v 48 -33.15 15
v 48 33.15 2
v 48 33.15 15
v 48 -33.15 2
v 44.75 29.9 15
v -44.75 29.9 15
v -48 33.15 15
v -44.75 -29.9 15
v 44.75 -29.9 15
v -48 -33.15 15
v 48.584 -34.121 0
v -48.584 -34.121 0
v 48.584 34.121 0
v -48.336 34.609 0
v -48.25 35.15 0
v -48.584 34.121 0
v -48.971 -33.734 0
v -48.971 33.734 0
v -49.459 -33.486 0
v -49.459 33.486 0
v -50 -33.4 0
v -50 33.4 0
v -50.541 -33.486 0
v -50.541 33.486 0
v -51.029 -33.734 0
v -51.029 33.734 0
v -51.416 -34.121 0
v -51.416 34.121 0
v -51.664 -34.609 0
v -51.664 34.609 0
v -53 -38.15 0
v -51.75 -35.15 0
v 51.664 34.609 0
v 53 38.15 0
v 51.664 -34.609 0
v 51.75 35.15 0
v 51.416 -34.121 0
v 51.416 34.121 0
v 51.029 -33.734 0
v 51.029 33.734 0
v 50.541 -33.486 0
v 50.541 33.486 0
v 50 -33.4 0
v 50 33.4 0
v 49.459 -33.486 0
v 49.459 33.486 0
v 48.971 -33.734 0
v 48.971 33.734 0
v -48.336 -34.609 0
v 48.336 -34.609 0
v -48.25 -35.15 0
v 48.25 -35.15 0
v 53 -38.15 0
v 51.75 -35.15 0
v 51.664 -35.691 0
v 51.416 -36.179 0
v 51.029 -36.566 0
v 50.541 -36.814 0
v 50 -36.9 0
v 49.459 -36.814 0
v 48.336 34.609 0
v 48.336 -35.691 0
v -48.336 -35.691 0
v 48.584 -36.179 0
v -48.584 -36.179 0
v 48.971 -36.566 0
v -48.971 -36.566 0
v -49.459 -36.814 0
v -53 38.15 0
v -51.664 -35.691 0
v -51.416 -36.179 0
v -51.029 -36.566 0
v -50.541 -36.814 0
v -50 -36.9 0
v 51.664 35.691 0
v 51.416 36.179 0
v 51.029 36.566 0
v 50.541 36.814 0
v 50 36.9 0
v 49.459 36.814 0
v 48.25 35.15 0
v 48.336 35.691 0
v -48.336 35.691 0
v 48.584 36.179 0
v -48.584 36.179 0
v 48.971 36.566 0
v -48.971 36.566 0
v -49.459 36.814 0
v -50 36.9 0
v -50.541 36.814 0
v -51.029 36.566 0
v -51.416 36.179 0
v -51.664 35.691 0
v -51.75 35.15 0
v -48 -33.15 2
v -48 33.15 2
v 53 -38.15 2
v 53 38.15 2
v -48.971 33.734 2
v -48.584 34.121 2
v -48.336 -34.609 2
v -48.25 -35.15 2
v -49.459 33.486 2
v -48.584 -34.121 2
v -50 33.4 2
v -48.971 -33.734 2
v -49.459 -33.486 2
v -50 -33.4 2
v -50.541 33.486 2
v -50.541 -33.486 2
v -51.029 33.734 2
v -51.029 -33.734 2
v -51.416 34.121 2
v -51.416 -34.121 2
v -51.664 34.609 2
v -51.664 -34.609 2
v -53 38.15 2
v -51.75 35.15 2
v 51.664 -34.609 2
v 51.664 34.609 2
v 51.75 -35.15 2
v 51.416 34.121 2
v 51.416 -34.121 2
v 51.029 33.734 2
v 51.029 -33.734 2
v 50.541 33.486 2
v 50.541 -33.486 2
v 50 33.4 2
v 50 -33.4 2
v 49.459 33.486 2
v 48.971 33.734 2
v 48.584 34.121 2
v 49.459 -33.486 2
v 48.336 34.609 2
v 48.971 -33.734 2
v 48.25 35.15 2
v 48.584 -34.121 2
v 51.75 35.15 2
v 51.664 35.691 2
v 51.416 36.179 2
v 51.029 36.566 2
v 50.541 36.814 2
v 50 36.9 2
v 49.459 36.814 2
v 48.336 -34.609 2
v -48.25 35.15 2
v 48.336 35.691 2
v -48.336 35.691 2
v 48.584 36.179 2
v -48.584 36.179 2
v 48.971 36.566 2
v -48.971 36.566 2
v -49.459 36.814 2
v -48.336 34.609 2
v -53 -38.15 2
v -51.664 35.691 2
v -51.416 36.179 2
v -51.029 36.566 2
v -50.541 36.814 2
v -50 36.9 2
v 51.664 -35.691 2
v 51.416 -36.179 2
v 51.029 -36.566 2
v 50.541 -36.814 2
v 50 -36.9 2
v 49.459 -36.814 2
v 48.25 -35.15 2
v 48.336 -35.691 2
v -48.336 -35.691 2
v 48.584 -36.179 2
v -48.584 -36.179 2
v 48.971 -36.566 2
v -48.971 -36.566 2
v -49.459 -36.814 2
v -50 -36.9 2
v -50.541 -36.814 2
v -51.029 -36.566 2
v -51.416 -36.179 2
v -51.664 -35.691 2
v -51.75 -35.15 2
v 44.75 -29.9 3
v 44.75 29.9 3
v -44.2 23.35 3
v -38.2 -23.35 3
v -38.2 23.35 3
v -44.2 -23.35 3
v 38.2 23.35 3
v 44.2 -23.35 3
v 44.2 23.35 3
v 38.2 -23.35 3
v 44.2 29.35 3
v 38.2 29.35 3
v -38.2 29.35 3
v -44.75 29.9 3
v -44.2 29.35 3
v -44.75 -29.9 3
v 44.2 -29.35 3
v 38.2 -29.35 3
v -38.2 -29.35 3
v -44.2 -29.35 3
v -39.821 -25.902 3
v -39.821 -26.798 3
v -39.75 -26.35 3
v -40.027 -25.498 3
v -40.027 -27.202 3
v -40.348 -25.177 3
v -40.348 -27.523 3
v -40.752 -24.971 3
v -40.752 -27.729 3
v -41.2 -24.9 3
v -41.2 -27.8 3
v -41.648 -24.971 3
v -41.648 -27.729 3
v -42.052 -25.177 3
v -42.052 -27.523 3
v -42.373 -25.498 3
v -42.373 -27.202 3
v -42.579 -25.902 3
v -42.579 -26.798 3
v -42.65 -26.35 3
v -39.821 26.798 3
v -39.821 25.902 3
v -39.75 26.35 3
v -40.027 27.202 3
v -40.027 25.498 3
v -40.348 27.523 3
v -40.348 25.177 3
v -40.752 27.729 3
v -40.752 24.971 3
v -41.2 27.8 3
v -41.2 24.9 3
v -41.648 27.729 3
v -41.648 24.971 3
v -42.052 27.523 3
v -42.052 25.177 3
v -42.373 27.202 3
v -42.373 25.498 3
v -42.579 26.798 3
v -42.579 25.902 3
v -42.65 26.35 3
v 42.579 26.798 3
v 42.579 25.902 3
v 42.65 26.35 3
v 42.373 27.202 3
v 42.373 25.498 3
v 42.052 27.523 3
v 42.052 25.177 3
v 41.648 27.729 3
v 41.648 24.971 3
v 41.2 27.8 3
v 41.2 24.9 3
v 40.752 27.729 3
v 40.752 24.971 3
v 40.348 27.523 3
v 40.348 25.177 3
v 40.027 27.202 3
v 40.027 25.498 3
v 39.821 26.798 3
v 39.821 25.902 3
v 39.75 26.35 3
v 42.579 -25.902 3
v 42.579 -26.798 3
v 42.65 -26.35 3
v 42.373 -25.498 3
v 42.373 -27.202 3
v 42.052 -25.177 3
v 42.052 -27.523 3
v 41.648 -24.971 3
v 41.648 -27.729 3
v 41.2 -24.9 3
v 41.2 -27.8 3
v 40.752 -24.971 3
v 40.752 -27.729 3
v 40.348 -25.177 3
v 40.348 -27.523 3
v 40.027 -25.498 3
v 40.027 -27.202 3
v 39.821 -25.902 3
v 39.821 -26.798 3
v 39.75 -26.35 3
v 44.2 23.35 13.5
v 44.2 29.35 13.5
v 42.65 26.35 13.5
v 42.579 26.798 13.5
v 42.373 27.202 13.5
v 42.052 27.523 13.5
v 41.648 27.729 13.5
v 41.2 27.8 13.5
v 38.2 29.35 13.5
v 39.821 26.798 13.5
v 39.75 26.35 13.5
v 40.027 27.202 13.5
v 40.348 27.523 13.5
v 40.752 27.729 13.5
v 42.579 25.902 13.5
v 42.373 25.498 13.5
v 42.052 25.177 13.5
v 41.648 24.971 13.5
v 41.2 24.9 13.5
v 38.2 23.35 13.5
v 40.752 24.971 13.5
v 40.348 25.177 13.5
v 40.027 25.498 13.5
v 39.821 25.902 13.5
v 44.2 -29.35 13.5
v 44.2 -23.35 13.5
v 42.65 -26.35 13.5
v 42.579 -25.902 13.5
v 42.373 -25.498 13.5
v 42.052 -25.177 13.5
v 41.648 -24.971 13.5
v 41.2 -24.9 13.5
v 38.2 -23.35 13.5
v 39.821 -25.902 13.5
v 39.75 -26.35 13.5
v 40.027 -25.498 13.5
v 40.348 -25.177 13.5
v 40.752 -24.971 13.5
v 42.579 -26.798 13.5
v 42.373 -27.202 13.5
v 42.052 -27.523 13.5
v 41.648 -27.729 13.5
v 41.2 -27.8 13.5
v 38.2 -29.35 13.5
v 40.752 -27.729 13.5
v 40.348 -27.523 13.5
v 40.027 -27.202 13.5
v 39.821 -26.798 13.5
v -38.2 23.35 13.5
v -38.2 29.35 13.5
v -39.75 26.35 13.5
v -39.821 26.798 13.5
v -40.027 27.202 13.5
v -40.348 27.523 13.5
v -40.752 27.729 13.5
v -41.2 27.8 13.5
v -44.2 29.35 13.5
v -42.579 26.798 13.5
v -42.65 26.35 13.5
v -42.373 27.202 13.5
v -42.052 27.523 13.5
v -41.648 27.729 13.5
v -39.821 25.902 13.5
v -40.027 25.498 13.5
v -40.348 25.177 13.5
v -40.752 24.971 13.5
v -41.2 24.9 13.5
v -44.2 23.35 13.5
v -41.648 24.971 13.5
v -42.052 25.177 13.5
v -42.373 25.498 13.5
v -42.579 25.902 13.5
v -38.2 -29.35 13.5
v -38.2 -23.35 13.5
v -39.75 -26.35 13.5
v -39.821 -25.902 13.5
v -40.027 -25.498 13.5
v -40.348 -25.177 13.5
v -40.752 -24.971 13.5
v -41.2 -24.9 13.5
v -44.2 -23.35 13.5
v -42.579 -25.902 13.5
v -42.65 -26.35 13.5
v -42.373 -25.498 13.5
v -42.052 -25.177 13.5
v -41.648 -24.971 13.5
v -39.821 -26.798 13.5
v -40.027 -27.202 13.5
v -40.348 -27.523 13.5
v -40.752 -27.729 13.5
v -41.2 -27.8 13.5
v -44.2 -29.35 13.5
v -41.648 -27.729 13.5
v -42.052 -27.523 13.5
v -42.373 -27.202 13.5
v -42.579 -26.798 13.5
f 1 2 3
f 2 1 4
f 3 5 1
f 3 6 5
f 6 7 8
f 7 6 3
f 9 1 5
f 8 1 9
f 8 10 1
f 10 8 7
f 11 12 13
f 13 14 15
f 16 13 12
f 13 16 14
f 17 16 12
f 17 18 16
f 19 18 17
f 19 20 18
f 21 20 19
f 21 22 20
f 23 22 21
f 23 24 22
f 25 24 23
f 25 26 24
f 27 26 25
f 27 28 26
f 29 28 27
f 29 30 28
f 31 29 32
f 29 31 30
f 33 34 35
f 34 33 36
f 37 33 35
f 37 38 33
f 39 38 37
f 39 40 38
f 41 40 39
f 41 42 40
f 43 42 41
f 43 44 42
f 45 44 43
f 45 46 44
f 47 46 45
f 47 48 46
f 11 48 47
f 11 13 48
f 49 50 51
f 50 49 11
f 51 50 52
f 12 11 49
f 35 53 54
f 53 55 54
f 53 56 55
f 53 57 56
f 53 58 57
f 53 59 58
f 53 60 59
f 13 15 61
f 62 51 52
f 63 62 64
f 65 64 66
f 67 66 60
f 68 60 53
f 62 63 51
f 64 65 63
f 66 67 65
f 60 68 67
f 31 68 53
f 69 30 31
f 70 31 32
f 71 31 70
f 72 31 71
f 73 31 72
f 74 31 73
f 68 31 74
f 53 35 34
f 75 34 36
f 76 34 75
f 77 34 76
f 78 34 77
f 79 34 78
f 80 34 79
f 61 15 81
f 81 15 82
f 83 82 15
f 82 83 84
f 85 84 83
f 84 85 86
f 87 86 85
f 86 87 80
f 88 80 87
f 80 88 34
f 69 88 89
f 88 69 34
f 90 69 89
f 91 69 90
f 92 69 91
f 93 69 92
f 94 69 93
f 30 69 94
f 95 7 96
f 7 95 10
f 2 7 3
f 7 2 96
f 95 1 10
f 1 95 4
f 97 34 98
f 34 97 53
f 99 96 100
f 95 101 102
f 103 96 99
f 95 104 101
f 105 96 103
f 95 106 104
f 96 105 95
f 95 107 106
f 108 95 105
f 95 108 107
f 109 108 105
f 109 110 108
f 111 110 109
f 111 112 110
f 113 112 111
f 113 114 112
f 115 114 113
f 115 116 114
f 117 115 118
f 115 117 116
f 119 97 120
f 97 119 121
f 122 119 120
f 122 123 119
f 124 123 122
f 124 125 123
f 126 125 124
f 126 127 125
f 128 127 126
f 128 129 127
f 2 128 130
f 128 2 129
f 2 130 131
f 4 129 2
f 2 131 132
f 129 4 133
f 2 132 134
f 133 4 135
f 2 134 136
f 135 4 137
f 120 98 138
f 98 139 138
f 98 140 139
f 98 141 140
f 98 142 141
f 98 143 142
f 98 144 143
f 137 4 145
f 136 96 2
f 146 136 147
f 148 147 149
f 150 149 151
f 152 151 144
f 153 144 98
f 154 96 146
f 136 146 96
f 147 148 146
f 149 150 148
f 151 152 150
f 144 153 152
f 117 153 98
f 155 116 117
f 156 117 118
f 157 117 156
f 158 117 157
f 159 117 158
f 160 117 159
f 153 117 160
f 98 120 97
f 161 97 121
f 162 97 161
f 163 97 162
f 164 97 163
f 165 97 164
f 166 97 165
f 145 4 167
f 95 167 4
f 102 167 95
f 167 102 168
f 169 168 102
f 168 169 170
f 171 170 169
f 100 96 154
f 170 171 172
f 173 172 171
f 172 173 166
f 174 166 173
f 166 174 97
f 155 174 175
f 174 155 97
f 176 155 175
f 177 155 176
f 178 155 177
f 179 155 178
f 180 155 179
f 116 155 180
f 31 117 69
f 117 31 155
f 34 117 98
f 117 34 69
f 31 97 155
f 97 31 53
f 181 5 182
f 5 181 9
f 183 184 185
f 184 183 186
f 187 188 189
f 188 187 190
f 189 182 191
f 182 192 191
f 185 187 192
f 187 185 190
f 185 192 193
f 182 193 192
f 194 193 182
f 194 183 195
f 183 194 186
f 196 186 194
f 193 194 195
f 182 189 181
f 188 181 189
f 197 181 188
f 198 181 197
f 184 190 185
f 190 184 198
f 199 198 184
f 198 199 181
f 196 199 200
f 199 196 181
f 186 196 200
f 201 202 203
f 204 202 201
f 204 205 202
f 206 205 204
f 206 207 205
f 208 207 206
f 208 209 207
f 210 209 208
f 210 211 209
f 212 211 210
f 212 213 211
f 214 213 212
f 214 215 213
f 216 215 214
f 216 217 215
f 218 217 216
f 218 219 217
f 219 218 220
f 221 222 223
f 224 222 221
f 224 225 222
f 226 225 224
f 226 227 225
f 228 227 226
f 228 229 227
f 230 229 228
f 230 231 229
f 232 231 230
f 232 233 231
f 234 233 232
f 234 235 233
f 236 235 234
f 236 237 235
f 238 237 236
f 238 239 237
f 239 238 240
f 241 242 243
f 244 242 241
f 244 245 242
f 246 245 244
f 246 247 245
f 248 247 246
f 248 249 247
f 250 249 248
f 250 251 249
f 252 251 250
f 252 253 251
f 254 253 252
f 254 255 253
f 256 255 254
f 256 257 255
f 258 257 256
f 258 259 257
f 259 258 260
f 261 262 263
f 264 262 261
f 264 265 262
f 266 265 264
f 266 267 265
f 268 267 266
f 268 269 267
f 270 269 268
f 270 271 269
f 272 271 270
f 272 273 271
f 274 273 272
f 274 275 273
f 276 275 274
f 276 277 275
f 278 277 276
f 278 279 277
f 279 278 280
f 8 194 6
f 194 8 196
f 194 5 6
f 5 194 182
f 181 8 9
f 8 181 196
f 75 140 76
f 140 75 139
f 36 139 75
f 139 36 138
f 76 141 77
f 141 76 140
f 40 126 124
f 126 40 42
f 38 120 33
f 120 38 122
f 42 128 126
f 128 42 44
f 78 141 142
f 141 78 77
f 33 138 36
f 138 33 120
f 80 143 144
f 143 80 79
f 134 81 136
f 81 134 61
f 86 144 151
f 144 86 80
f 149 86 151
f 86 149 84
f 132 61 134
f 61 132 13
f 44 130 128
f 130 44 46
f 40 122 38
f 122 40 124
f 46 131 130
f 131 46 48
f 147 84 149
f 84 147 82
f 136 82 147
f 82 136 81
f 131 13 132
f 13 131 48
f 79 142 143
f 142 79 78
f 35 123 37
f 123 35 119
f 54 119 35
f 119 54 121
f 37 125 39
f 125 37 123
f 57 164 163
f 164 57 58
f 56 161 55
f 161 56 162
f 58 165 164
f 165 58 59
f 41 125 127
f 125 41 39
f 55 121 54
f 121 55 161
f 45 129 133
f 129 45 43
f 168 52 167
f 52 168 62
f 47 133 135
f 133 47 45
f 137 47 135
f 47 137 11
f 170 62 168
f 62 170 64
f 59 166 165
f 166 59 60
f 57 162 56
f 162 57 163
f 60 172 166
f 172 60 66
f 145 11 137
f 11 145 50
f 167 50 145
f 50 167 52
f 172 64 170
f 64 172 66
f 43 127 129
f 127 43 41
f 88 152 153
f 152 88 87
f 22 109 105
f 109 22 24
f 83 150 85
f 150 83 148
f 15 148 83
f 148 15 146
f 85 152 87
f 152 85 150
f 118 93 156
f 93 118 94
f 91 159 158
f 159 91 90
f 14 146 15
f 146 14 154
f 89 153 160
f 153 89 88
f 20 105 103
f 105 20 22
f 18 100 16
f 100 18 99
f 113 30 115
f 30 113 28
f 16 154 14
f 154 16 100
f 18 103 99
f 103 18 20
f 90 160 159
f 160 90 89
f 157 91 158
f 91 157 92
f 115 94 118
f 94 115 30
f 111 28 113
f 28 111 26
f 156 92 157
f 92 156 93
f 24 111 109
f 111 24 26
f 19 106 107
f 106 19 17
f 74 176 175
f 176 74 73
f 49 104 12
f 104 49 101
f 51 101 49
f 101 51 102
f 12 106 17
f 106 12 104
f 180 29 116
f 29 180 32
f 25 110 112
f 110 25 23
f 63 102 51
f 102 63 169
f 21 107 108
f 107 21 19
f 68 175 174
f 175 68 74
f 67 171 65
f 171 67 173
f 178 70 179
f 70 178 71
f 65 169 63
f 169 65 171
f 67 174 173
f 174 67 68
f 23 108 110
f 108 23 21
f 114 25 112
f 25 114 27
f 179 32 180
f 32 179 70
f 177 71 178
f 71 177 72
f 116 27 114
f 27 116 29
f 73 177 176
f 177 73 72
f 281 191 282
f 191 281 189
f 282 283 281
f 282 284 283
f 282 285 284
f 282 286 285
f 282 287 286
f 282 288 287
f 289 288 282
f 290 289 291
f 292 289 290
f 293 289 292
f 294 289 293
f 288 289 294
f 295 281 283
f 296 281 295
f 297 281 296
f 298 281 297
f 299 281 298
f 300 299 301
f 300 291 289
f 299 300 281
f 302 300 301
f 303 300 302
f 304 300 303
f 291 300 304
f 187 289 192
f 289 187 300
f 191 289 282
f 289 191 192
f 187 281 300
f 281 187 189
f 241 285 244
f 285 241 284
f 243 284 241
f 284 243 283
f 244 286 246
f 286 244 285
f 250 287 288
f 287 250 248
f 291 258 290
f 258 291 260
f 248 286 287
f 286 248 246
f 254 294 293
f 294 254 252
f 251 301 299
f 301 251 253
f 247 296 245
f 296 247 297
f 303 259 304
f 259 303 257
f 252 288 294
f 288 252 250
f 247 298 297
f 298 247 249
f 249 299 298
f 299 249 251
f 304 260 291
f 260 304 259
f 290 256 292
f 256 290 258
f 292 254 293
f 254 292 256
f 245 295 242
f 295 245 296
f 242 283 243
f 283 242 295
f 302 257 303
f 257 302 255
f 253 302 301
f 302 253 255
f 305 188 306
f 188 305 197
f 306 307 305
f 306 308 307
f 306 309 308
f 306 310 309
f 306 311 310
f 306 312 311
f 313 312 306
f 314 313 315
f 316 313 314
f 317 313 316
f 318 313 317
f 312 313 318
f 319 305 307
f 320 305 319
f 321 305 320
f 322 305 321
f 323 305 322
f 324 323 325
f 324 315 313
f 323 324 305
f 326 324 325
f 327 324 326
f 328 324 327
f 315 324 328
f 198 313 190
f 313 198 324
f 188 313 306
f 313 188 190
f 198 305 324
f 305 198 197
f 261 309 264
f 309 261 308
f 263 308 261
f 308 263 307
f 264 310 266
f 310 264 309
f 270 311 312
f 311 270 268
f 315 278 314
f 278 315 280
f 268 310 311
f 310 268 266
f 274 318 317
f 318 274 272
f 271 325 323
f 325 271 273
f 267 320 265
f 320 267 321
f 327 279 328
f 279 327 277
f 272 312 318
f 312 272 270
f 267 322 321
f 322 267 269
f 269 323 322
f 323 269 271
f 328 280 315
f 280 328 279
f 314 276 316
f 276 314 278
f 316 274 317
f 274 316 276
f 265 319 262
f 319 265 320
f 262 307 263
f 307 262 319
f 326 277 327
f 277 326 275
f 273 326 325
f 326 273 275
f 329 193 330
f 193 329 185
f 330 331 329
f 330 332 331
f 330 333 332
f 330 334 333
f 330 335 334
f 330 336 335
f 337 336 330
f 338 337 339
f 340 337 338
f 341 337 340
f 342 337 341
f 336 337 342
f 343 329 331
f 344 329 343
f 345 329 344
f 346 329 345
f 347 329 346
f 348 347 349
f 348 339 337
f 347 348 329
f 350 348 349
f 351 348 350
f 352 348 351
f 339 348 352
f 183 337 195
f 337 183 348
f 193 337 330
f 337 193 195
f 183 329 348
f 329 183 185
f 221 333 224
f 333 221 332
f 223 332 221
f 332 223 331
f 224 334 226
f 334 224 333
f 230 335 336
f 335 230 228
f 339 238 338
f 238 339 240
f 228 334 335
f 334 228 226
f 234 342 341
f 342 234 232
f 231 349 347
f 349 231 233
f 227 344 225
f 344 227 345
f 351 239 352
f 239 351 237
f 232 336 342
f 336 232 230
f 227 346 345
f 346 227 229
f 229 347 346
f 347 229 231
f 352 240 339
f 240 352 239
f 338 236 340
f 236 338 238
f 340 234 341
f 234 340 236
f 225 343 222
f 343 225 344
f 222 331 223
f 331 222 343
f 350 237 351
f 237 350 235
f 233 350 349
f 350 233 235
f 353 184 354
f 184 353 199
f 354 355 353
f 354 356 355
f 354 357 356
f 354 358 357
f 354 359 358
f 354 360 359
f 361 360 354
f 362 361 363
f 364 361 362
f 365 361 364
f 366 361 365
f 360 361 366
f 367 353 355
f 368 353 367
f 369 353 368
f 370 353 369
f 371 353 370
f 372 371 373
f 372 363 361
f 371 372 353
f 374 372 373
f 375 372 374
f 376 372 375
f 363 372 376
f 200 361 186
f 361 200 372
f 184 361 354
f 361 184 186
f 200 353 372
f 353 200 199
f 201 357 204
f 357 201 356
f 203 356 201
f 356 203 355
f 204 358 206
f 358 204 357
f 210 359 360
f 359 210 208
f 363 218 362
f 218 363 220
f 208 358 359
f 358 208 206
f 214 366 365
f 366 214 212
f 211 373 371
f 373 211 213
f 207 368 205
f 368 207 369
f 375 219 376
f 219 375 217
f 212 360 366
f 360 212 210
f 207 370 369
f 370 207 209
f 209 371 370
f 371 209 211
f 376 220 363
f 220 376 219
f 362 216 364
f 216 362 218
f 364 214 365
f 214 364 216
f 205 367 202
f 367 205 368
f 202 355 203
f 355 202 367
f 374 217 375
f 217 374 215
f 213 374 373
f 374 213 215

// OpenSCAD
/* File: ~/GliderWinchItems/BMS/hw/CantoRibbonBox.scad
  * frame for pc board
  * Latest edit: 20210930
 */
 
 $fn=20;
  
module rounded_rectangle_hull(wid,slen,ht,rad)
{
 hull()
 {    
    translate([-wid/2+rad,rad,0])
        cylinder(r=rad,h=ht,center=false);

   translate([ wid/2-rad,rad,0])
        cylinder(r=rad,h=ht,center=false);

    translate([-wid/2+rad,slen-rad,0])
        cylinder(r=rad,h=ht,center=false);
    
    translate([ wid/2-rad,slen-rad,0])
        cylinder(r=rad,h=ht,center=false);
 }
}
len = 90.0+0.0;
wid = 60.3+0.0;
ht = 15;
wall = 3;
bot = 3;

psq = 6.0;
pht = ht - 1.5;
pholey = wid-6;
pholex = len-6;

module post(a)
{
    translate(a)
    {
        difference()
        {
            union()
            {
                translate([0,0,pht/2])
                cube([psq,psq,pht],center = true);
            }
            union()
            {
                cylinder(d=2.9,h=100, center=false);
            }
        }
    }
}


module box()
{
    del1 = 2.5;
    difference()
    {
        union()
        {
            translate([0,0,ht/2])
            cube([len+2*wall,wid+2*wall,ht],center = true);
            translate([0,0,2/2])
            cube([len+2*wall+10,wid+2*wall+10,2],center = true);

        }
        union()
        {
            translate([0,0,ht/2+bot])
            cube([len-wall+del1,wid-wall+del1,ht],center = true);
            
            xofx = len/2+wall+2;
            xofy = wid/2+wall+2;
            translate([ xofx, xofy,0]) cylinder(d=3.5,h=50,center=true);
            translate([ xofx,-xofy,0]) cylinder(d=3.5,h=50,center=true);
            translate([-xofx, xofy,0]) cylinder(d=3.5,h=50,center=true);
            translate([-xofx,-xofy,0]) cylinder(d=3.5,h=50,center=true);
        }
    }
}
poffx = pholex/2-0.8;
poffy = pholey/2-0.8;
box();
post([ poffx, poffy,0]);
post([ poffx,-poffy,0]);
post([-poffx, poffy,0]);
post([-poffx,-poffy,0]);
